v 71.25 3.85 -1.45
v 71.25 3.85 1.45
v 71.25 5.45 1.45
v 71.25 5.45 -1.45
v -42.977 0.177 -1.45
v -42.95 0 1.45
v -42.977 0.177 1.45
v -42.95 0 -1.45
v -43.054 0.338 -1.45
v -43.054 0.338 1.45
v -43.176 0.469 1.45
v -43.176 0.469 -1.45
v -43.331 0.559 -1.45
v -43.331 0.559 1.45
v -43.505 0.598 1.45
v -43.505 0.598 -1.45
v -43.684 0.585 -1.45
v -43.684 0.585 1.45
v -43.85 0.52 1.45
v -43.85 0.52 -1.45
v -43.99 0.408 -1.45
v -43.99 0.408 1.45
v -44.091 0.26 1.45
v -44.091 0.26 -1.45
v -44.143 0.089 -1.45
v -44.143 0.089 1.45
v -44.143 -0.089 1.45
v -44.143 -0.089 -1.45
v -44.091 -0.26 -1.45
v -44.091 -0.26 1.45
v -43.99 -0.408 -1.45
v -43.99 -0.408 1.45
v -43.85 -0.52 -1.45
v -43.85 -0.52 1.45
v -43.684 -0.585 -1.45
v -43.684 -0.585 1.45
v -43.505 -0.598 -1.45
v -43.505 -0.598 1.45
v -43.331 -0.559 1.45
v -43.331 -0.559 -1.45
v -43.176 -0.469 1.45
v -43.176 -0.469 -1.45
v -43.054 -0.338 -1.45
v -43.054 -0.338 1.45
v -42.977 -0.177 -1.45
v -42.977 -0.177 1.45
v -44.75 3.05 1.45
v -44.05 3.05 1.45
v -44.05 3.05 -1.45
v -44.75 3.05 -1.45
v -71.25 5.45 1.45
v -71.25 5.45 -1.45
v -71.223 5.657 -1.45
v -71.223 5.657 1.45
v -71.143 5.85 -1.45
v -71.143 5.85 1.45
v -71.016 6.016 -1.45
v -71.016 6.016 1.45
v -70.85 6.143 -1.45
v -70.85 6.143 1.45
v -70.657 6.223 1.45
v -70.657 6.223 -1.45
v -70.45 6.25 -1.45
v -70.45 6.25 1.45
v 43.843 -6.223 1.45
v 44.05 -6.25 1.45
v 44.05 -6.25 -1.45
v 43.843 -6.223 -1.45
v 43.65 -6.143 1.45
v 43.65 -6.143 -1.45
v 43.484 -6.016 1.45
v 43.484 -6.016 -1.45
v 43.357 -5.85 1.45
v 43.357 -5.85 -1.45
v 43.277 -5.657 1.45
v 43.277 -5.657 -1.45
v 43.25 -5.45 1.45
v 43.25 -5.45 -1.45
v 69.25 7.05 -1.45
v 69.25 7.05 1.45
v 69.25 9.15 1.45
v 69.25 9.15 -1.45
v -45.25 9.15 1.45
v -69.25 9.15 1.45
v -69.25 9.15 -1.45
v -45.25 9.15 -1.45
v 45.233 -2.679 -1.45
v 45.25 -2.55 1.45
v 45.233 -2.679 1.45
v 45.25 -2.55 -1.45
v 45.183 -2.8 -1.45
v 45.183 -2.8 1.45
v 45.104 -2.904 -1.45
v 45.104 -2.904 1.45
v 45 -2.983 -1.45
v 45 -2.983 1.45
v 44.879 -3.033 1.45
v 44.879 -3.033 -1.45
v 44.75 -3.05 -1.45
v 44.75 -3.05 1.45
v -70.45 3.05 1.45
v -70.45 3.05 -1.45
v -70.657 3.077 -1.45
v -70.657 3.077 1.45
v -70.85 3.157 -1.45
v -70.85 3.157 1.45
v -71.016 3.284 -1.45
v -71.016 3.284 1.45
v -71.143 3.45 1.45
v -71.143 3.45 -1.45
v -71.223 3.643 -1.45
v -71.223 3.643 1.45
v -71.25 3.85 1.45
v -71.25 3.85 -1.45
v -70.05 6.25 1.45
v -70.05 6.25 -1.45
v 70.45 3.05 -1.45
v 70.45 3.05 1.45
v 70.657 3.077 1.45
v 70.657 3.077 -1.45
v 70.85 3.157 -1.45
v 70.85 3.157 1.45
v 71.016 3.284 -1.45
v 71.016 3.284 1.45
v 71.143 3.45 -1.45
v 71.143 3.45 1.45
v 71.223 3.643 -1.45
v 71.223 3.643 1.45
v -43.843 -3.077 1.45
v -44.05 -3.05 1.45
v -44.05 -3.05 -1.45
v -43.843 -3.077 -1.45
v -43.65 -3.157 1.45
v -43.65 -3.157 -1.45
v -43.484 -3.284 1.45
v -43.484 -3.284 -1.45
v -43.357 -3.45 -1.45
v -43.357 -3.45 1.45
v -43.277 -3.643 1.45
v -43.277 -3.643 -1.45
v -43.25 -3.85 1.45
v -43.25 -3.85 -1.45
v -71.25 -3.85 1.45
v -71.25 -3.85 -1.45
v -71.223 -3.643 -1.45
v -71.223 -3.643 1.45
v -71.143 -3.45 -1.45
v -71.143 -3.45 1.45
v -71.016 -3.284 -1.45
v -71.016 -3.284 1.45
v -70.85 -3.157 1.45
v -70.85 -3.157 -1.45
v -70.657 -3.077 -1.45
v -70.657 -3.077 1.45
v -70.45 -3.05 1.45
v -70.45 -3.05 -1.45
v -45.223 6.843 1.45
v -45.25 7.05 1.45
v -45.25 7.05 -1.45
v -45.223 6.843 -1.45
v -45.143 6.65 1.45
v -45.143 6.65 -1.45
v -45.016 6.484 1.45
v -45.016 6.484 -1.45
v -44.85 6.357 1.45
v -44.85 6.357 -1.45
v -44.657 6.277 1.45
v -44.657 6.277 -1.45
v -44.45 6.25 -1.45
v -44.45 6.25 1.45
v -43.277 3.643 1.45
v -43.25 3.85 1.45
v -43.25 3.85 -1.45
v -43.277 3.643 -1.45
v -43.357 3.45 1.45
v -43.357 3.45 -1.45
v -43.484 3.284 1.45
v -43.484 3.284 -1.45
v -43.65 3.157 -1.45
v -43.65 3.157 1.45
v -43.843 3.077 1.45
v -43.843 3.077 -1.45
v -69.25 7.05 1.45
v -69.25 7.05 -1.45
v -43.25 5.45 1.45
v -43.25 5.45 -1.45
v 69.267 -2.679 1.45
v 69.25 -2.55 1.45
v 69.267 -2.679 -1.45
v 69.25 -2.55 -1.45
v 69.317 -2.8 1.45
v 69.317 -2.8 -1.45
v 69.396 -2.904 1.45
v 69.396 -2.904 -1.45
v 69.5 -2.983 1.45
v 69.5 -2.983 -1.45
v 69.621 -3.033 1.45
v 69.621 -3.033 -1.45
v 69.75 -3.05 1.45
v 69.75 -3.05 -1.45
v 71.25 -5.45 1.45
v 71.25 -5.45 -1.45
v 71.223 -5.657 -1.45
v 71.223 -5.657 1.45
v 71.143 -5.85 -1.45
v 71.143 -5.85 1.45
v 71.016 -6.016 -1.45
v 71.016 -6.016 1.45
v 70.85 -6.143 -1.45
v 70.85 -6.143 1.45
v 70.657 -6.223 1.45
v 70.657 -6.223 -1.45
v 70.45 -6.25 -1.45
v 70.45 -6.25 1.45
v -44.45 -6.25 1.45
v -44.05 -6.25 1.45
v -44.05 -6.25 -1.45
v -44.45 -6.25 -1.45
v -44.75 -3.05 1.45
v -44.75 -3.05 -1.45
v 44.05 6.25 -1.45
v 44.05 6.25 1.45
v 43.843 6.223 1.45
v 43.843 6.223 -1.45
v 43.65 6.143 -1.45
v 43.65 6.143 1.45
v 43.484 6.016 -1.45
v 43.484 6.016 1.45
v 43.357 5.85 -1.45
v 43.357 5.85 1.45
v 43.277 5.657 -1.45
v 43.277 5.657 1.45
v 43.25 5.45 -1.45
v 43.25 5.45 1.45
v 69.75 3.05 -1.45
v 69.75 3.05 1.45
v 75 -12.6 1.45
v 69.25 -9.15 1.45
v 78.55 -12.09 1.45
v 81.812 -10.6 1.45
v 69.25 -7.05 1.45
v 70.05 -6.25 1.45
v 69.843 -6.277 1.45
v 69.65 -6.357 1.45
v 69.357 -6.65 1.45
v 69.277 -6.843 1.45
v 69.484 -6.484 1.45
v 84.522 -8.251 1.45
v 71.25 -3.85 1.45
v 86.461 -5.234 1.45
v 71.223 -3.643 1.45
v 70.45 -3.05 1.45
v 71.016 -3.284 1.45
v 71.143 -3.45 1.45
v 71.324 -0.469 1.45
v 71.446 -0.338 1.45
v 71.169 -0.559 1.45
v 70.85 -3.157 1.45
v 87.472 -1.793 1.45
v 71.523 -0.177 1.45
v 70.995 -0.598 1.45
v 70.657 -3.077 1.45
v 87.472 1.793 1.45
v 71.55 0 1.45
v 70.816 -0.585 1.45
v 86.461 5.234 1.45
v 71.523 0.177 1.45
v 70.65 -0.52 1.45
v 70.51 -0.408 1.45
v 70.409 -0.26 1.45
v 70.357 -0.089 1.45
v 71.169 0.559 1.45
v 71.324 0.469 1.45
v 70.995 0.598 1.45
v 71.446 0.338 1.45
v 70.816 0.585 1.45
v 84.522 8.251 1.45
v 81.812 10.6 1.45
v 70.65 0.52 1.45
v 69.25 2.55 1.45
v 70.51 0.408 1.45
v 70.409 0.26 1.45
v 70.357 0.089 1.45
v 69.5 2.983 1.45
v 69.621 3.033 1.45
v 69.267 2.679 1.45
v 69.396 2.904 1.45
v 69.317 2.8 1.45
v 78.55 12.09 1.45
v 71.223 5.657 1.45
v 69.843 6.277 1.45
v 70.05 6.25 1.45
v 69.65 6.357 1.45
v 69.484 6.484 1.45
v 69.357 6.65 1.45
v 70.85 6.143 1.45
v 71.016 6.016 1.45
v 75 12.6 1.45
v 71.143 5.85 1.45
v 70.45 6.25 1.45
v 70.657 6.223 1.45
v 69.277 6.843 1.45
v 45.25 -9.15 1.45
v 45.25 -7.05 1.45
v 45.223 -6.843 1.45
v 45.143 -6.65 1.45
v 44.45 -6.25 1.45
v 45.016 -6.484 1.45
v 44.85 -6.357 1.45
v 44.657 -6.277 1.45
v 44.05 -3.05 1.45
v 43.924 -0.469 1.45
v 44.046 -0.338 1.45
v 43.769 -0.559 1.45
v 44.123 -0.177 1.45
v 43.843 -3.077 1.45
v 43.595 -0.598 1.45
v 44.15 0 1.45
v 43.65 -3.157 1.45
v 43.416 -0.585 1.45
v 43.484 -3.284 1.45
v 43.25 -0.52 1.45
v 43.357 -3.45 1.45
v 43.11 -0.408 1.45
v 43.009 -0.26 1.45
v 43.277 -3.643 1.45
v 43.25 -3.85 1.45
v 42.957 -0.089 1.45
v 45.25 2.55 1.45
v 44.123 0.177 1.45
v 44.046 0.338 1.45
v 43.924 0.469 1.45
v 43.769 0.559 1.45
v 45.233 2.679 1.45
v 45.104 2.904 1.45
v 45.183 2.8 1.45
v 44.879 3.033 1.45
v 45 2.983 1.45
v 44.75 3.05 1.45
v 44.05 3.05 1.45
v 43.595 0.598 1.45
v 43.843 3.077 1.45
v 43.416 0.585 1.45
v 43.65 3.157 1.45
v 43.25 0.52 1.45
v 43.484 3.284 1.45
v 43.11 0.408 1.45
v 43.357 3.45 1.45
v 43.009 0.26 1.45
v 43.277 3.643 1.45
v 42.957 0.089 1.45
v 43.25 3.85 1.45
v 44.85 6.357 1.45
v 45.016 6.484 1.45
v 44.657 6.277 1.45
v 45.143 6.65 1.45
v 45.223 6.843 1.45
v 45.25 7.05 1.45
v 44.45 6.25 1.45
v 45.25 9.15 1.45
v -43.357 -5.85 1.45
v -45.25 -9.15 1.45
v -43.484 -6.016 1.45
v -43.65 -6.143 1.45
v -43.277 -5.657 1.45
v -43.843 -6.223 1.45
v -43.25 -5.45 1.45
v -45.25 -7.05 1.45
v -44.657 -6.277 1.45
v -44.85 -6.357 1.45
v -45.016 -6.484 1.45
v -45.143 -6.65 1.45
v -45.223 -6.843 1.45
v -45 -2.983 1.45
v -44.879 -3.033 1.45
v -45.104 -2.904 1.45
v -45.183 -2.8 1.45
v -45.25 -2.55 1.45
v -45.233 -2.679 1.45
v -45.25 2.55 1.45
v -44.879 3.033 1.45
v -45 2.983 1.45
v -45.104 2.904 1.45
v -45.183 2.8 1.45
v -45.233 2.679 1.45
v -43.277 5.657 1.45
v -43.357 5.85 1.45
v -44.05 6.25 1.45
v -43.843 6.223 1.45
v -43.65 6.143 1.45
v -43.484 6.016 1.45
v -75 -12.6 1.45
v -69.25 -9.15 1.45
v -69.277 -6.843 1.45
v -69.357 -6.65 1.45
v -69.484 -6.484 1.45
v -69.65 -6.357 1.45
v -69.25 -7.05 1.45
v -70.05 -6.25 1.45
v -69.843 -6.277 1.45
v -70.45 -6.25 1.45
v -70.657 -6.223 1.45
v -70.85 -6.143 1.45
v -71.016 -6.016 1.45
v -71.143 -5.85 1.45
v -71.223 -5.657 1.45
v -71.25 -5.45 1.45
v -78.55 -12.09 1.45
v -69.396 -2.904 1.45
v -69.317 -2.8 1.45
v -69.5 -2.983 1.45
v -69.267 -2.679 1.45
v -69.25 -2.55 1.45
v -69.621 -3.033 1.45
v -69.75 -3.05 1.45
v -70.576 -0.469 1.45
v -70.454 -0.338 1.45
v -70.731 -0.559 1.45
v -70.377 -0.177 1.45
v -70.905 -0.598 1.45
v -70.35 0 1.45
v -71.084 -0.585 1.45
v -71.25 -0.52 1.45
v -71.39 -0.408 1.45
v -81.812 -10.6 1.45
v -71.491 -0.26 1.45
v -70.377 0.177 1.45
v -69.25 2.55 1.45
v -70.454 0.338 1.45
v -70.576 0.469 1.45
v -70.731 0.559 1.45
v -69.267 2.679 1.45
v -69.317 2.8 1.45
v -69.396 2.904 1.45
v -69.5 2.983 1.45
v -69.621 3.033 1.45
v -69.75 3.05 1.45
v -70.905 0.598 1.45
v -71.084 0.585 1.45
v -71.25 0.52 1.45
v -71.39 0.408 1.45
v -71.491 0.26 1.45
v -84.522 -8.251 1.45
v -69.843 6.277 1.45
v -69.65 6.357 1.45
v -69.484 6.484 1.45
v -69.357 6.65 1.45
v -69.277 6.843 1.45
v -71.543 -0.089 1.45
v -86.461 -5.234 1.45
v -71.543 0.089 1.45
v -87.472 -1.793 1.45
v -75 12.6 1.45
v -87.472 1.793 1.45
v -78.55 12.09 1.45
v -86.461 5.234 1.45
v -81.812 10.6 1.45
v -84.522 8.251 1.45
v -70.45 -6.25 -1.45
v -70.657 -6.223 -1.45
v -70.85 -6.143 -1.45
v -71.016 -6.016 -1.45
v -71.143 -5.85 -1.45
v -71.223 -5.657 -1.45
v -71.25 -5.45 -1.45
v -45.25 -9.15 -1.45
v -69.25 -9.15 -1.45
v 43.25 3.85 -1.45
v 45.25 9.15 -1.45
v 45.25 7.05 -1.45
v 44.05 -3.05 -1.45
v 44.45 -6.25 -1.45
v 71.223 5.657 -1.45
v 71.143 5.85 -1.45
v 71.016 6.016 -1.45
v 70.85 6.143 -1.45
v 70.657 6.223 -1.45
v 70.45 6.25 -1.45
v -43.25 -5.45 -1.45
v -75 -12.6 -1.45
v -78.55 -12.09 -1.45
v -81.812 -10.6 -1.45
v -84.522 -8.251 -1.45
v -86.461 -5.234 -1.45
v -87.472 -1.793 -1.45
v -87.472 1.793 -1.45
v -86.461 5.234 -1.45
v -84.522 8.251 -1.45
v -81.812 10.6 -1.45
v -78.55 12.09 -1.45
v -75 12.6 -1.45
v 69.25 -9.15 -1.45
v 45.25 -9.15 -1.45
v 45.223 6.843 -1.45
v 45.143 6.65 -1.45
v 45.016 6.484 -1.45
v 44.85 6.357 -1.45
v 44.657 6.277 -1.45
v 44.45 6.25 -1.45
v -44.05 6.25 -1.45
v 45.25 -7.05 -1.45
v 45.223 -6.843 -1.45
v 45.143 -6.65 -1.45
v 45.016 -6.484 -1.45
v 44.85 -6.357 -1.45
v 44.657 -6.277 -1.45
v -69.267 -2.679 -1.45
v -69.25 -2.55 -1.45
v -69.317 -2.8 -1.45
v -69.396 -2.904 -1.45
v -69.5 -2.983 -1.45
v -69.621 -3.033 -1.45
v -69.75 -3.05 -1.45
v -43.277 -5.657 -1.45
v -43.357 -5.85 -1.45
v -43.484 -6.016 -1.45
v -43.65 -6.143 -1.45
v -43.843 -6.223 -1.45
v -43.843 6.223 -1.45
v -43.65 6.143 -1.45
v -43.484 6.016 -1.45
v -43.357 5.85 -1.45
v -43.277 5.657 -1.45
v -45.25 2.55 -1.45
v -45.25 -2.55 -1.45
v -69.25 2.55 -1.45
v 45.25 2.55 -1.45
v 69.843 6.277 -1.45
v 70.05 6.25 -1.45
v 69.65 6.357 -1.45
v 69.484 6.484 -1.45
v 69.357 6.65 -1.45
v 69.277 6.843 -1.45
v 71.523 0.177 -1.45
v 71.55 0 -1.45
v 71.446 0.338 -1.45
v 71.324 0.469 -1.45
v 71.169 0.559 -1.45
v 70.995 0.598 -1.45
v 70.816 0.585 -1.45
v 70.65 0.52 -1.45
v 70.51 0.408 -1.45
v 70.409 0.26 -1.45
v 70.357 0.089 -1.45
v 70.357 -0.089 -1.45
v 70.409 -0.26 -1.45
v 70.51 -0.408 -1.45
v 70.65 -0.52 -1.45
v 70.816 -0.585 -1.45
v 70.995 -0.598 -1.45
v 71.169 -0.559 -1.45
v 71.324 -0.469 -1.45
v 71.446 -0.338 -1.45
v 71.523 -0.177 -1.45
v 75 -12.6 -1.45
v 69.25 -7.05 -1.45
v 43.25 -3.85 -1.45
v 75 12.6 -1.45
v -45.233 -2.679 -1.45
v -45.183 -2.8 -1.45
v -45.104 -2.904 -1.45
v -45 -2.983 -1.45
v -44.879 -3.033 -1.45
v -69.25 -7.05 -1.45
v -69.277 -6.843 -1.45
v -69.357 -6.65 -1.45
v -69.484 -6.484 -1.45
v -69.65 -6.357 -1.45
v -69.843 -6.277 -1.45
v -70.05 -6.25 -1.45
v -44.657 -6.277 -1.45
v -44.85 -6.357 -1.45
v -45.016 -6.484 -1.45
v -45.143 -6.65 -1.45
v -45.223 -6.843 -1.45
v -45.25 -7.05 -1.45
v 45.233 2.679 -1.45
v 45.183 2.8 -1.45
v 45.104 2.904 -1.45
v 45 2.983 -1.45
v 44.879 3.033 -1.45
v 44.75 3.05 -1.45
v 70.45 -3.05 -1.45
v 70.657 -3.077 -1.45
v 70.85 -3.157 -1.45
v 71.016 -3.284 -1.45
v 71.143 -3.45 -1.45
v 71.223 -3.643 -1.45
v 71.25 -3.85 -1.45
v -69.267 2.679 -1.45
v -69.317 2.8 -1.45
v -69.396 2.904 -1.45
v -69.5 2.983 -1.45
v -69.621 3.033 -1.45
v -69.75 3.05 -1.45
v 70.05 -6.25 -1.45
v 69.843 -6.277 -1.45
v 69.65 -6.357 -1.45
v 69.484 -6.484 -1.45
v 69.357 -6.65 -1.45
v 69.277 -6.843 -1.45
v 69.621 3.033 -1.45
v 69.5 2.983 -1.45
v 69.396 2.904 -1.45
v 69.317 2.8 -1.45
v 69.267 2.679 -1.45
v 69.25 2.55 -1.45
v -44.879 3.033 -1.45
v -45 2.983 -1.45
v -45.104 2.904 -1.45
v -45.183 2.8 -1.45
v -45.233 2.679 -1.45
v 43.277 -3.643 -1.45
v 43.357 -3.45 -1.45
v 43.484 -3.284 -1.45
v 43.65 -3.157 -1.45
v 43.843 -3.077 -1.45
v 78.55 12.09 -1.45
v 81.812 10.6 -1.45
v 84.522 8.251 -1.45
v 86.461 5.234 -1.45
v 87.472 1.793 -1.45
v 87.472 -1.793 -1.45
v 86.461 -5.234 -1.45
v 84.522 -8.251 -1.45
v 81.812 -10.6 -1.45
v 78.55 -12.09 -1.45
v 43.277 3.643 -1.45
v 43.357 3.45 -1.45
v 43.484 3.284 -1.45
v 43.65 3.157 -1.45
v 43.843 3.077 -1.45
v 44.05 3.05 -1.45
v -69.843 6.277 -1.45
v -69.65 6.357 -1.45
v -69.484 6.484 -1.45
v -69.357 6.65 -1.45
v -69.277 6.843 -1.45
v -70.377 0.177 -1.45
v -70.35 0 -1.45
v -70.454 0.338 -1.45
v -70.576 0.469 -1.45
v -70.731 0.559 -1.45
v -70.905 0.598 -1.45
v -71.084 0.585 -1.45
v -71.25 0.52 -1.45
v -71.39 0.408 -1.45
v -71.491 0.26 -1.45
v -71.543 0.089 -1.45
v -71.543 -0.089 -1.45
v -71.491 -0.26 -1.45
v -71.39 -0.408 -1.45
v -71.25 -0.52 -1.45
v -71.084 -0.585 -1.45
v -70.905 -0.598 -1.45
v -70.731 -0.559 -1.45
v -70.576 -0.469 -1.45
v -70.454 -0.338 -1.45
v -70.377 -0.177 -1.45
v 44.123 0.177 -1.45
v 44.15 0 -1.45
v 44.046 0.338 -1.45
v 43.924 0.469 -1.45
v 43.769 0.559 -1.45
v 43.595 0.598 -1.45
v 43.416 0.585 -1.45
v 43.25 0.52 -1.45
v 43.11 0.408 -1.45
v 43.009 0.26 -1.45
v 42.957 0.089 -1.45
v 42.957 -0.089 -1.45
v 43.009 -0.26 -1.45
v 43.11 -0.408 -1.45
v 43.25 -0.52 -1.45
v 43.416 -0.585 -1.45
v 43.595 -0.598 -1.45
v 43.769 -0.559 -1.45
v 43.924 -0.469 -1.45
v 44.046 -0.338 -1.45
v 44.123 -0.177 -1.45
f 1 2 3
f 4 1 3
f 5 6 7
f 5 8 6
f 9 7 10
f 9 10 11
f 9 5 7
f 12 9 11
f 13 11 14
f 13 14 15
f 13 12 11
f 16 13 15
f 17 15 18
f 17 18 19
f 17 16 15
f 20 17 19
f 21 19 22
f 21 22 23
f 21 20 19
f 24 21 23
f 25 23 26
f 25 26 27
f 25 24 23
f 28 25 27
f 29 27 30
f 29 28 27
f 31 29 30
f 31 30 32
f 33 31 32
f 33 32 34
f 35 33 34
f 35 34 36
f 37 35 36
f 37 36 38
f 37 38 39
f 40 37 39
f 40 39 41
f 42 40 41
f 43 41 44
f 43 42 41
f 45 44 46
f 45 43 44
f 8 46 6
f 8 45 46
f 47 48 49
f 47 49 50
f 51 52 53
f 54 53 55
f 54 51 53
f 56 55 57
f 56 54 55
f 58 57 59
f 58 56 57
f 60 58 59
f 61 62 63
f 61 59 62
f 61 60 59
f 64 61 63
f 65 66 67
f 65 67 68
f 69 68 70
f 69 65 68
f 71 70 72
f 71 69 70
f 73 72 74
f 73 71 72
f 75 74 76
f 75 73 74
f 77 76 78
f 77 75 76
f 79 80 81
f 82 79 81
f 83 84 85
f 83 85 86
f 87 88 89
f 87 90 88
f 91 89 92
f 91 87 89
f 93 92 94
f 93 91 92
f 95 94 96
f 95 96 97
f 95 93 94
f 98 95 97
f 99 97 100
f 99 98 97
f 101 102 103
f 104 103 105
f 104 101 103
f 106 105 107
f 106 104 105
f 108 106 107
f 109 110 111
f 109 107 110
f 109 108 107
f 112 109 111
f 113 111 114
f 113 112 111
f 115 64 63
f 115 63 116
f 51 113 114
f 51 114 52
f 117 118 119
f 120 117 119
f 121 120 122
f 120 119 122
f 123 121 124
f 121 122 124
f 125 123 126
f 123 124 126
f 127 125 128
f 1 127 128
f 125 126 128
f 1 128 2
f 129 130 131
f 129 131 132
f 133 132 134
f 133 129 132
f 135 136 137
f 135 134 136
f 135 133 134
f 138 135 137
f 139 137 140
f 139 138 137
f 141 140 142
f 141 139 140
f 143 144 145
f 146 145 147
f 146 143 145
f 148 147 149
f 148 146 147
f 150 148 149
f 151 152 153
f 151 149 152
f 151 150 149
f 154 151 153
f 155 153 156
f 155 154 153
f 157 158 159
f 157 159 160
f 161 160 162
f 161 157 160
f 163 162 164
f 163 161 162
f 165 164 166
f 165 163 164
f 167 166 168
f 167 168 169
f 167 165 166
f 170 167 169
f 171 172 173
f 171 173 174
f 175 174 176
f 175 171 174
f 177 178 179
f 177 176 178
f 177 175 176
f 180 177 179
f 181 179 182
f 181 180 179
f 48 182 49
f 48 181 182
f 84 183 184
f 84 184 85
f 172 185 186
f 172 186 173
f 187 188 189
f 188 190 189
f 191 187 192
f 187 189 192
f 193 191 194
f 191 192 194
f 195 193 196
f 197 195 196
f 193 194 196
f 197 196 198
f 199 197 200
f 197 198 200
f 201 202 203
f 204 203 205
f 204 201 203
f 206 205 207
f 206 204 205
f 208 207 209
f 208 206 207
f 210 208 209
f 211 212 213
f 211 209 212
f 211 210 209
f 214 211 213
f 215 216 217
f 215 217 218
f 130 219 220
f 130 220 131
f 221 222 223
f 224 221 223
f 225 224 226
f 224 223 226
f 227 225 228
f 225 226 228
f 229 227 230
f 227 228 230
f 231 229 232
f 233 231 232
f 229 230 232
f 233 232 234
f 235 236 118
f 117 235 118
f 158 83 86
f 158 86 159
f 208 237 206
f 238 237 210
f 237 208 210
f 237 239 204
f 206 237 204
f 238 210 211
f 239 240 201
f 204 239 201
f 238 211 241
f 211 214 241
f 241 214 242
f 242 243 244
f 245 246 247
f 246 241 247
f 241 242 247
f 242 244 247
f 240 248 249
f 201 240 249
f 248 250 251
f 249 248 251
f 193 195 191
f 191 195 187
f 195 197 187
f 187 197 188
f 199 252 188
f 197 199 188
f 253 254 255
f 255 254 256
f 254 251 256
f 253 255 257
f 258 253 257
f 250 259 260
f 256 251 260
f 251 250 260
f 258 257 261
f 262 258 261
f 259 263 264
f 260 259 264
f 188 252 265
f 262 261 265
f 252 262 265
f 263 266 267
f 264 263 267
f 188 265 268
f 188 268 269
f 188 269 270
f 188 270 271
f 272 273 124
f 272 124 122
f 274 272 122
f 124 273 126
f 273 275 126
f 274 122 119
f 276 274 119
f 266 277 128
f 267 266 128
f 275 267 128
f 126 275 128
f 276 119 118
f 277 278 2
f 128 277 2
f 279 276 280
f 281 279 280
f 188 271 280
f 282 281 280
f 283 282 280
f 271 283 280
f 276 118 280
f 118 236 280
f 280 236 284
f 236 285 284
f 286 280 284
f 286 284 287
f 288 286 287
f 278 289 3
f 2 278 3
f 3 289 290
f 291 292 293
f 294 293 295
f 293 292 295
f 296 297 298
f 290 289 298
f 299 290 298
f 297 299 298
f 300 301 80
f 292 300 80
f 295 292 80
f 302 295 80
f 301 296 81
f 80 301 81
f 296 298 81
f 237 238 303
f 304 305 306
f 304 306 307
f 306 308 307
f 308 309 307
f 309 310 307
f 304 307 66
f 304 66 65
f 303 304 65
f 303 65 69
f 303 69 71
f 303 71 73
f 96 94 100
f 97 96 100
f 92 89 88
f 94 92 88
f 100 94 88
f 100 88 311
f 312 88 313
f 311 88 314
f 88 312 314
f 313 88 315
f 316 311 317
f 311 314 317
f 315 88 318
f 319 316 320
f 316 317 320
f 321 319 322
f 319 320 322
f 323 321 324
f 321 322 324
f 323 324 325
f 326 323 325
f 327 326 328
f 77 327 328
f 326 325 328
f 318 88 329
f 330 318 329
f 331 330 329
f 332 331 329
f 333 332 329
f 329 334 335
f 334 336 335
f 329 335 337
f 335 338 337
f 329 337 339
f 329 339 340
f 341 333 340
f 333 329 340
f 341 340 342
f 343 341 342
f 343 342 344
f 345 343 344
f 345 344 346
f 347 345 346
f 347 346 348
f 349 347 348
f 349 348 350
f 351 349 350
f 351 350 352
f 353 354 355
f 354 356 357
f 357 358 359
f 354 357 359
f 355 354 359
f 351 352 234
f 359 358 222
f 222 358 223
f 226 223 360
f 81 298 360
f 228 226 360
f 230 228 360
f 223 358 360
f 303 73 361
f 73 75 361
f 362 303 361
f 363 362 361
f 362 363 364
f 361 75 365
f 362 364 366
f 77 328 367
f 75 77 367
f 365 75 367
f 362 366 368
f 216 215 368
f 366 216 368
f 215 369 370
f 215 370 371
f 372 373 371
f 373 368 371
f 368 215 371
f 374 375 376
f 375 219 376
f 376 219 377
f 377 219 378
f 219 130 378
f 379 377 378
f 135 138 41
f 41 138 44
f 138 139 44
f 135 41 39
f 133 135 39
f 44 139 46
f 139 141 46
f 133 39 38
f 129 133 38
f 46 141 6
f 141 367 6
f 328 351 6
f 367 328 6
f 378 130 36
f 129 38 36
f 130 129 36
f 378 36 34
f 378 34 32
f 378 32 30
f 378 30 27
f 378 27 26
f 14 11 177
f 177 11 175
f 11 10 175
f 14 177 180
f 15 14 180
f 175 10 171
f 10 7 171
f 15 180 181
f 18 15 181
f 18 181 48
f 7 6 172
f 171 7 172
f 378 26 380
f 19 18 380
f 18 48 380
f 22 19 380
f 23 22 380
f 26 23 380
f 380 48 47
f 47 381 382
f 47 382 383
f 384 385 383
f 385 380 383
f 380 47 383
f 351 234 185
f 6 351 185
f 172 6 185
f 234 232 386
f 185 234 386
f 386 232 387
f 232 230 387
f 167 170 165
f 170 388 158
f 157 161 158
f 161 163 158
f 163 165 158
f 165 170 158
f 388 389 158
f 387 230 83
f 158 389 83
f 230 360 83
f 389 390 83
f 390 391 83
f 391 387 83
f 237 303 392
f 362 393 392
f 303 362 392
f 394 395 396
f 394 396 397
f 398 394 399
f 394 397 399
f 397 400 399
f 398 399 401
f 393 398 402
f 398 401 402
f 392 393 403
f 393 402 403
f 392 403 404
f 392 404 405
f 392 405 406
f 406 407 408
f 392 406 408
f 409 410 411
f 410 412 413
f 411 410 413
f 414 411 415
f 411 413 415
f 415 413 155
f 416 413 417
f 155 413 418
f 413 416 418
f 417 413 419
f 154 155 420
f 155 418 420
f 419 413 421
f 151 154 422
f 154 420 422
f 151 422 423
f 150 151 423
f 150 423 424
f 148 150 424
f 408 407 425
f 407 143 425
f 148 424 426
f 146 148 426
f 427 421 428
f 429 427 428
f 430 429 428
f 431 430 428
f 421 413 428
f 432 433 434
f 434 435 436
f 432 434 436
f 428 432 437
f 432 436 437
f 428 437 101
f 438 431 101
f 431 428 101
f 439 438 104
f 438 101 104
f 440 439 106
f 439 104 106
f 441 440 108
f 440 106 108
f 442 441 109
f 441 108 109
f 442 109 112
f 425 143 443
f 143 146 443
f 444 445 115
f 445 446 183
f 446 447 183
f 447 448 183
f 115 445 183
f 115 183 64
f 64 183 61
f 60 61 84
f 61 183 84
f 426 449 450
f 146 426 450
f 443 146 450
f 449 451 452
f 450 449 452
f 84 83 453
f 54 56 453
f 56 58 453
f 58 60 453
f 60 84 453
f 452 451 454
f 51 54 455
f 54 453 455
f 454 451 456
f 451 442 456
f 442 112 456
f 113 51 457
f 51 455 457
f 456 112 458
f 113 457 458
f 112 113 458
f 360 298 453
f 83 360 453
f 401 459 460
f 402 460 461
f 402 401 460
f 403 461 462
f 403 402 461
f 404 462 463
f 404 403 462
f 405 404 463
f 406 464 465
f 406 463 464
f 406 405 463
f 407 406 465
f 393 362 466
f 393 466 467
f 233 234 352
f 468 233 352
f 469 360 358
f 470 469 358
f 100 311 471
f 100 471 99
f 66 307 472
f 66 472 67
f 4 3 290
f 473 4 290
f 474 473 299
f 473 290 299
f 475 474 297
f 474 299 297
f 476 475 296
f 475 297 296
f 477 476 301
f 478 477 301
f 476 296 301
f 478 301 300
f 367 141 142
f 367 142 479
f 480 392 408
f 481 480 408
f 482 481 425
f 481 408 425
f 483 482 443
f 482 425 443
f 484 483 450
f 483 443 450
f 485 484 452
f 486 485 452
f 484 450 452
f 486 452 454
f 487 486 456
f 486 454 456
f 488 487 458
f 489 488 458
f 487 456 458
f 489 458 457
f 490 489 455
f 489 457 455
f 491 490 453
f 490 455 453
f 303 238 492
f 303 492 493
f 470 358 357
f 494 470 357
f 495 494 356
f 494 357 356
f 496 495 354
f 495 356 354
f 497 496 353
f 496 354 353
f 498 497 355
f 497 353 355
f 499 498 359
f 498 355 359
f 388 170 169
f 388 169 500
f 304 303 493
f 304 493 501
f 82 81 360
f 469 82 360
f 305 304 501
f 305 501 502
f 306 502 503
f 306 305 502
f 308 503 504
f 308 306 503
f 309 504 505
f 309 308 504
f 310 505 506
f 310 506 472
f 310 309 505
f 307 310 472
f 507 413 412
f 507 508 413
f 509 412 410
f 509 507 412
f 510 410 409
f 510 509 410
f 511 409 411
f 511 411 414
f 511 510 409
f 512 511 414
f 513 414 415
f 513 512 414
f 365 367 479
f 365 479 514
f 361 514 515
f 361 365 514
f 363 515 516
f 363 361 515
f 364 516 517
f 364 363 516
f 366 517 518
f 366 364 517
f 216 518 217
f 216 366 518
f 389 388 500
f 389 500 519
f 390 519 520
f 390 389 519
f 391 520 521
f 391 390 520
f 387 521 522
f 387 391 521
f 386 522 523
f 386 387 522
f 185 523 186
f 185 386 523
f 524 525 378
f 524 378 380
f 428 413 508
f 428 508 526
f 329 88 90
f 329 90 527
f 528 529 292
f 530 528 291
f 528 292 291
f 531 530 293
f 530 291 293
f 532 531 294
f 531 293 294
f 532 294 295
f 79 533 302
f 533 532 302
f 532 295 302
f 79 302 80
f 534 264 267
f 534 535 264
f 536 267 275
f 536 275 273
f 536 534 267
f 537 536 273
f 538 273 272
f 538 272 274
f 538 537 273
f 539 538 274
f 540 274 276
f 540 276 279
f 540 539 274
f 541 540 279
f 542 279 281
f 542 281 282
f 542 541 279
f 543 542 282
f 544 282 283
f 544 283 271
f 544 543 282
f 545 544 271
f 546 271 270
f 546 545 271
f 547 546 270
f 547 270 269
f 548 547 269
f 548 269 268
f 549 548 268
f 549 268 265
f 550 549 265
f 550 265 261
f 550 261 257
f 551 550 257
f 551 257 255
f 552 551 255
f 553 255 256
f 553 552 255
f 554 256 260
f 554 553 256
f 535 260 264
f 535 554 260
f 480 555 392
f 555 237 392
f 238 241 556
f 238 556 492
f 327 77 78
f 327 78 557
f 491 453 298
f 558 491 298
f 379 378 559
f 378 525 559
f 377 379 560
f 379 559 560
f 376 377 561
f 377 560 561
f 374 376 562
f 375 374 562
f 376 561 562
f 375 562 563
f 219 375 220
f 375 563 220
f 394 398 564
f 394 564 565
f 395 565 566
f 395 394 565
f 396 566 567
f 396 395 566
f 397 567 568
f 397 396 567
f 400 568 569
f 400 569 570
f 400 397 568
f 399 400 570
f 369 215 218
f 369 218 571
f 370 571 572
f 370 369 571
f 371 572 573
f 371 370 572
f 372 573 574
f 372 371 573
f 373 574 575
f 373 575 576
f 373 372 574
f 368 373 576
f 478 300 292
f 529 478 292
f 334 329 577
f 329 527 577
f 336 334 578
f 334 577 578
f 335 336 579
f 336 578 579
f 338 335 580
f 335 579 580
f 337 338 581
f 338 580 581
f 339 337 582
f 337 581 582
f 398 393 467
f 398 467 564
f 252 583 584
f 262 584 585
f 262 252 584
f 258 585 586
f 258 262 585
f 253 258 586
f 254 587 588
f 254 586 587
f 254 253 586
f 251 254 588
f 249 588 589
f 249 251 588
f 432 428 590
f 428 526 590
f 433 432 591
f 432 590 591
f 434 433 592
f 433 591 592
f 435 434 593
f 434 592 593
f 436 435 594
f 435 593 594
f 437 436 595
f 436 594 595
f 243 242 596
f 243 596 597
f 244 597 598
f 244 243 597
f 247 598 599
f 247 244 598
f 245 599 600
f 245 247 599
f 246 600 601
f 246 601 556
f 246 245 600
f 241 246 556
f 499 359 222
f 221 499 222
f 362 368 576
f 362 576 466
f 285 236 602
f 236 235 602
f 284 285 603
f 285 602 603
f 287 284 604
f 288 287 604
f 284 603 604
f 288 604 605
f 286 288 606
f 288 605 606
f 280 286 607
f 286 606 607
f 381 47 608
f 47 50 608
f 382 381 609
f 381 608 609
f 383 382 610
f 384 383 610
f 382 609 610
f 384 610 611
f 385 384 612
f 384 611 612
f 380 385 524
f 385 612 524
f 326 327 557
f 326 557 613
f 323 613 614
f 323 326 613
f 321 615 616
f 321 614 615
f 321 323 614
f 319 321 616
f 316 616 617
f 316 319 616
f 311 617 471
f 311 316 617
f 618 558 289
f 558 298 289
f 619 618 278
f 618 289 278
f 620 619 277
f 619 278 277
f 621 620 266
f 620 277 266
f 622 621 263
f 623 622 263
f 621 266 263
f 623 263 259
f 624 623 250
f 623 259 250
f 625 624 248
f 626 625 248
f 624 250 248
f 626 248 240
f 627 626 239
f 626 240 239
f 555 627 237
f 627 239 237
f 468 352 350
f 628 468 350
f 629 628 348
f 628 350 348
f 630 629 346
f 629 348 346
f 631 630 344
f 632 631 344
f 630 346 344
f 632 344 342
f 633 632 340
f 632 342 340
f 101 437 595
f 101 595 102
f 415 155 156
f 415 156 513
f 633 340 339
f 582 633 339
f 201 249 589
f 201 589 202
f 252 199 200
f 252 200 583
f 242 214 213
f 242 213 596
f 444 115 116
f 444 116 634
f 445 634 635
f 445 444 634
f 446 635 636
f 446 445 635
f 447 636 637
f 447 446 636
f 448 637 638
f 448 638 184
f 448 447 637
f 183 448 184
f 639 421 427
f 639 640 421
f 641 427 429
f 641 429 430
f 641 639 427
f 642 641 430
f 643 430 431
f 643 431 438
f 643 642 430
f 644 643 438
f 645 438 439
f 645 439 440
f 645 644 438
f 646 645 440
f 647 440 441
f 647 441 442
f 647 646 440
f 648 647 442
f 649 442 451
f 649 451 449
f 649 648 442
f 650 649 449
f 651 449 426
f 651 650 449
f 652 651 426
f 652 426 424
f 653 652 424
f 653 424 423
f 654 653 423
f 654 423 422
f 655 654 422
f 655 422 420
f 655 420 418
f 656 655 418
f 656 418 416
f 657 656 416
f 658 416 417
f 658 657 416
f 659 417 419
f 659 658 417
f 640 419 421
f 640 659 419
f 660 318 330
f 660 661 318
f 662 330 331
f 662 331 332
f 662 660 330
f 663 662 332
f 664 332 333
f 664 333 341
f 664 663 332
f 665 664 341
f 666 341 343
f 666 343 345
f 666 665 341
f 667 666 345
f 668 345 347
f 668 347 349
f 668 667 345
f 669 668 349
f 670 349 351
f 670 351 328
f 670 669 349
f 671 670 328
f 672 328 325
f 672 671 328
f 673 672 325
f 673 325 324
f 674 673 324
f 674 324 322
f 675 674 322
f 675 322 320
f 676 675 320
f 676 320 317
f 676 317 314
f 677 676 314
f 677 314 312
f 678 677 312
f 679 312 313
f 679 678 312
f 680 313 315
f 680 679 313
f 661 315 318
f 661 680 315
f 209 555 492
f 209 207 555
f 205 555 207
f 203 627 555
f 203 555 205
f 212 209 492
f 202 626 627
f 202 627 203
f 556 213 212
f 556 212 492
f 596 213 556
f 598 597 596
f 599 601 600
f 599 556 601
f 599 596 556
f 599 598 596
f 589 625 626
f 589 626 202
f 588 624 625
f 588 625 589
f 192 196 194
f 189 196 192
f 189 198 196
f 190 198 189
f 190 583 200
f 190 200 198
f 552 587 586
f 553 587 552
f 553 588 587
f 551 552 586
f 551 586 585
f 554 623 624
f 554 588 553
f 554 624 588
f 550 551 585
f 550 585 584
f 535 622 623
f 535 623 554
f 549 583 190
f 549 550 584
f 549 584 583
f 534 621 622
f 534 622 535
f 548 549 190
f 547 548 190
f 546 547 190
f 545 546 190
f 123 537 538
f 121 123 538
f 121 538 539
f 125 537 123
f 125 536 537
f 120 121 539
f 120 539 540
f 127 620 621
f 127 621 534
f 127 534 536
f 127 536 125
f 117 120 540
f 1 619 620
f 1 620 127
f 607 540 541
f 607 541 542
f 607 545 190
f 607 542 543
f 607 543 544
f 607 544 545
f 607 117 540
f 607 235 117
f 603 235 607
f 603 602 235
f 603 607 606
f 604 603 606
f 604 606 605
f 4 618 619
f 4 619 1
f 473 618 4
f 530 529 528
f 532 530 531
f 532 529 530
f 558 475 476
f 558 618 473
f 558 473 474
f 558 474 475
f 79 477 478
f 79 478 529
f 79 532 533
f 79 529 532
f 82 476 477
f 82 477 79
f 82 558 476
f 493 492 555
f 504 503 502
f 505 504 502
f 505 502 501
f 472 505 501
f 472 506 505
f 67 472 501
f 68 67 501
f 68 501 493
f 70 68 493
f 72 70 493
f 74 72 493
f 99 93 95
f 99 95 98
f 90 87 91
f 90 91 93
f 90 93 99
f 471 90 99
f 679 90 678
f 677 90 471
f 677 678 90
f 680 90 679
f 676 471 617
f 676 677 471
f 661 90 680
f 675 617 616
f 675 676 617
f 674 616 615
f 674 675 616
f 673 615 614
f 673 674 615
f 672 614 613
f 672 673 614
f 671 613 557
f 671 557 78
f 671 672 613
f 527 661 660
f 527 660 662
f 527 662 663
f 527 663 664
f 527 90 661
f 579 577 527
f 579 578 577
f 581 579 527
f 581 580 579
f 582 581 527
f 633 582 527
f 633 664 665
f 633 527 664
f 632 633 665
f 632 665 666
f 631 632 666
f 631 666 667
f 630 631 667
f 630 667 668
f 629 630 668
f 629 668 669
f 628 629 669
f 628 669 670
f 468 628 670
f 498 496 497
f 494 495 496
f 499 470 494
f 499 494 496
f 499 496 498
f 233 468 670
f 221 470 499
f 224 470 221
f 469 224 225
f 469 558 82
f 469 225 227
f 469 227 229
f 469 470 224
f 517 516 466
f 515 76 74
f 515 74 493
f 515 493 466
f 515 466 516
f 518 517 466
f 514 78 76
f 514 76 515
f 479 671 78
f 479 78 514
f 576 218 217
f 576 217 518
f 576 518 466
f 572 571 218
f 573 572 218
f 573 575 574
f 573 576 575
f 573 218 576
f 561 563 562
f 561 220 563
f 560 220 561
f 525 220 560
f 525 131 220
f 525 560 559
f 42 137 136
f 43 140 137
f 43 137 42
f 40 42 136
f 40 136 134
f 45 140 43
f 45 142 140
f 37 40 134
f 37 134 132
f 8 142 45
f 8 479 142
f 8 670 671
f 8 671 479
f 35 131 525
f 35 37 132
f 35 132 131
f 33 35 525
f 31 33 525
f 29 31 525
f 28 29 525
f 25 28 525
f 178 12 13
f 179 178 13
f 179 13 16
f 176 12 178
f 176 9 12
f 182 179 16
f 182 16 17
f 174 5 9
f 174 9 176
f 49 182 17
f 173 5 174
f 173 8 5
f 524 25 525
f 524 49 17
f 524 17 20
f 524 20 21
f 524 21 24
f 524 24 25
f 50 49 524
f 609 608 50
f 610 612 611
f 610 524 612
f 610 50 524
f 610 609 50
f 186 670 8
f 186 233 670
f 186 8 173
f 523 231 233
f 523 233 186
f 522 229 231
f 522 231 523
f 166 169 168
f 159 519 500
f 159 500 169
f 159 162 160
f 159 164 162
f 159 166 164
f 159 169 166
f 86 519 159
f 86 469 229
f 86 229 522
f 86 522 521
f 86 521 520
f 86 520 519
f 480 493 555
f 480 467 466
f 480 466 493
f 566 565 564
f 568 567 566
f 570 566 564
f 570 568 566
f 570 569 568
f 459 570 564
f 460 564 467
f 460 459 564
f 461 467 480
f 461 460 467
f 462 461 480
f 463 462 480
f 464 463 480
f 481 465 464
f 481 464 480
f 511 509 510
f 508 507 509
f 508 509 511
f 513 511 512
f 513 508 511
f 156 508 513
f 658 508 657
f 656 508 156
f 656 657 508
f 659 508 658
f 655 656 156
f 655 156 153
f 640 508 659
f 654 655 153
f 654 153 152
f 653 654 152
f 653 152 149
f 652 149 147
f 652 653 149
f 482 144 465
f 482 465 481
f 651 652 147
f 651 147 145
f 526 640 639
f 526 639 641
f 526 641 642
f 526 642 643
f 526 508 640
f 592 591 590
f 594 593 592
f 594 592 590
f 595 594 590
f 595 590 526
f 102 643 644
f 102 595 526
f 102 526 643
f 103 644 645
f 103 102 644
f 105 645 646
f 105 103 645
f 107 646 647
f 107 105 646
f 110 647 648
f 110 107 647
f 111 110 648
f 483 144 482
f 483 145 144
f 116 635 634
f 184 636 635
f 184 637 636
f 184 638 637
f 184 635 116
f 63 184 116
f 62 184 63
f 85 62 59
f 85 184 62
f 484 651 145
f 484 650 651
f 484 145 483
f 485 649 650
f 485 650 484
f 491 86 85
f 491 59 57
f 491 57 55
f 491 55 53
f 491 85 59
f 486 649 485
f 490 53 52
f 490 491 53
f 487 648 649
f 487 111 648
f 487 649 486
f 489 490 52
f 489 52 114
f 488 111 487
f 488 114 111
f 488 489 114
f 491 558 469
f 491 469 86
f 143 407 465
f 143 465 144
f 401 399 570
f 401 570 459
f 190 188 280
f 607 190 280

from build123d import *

# Parameters (mm, degrees)
SKETCH_1_R          = 0.6
SKETCH_1_W          = 24
SKETCH_1_H          = 12.5
EXTRUDE_1_DEPTH     = 1.45
CUT_EXTRUDE_1_DEPTH = 3
FILLET_1_R          = 0.5


with BuildPart() as part:
    # 草图1 → 凸台-拉伸1 (new body, symmetric)
    with BuildSketch(Plane.XY):
        with BuildLine():
            Line((-75, 12.6), (75, 12.6))
            ThreePointArc((75, 12.6), (87.6, 0), (75, -12.6))
            Line((75, -12.6), (-75, -12.6))
            ThreePointArc((-75, -12.6), (-87.6, 0), (-75, 12.6))
        make_face()
        with Locations((-43.55, 0)):
            Circle(SKETCH_1_R, mode=Mode.SUBTRACT)
        with Locations((-70.95, 0)):
            Circle(SKETCH_1_R, mode=Mode.SUBTRACT)
        with Locations((70.95, 0)):
            Circle(SKETCH_1_R, mode=Mode.SUBTRACT)
        with Locations((43.55, 0)):
            Circle(SKETCH_1_R, mode=Mode.SUBTRACT)
        with Locations((-57.25, 0)):
            Rectangle(SKETCH_1_W, SKETCH_1_H, mode=Mode.SUBTRACT)
        with Locations((57.25, 0)):
            Rectangle(SKETCH_1_W, SKETCH_1_H, mode=Mode.SUBTRACT)
    extrude(amount=EXTRUDE_1_DEPTH, both=True)

    # 草图2 → 切除-拉伸1 (cut)
    with BuildSketch(Plane.XY.offset(1.45)):
        with BuildLine():
            Line((44.45, 6.25), (44.05, 6.25))
            ThreePointArc((44.05, 6.25), (43.484314575, 6.015685425), (43.25, 5.45))
            Line((43.25, 5.45), (43.25, 3.85))
            ThreePointArc((43.25, 3.85), (43.484314575, 3.284314575), (44.05, 3.05))
            Line((44.05, 3.05), (45.25, 3.05))
            Line((45.25, 3.05), (45.25, 6.25))
            Line((45.25, 6.25), (69.25, 6.25))
            Line((69.25, 6.25), (69.25, 3.05))
            Line((69.25, 3.05), (70.45, 3.05))
            ThreePointArc((70.45, 3.05), (71.015685425, 3.284314575), (71.25, 3.85))
            Line((71.25, 3.85), (71.25, 5.45))
            ThreePointArc((71.25, 5.45), (71.015685425, 6.015685425), (70.45, 6.25))
            Line((70.45, 6.25), (70.05, 6.25))
            ThreePointArc((70.05, 6.25), (69.484314575, 6.484314575), (69.25, 7.05))
            Line((69.25, 7.05), (69.25, 9.15))
            Line((69.25, 9.15), (45.25, 9.15))
            Line((45.25, 9.15), (45.25, 7.05))
            ThreePointArc((45.25, 7.05), (45.015685425, 6.484314575), (44.45, 6.25))
        make_face()
        with BuildLine():
            Line((44.05, -3.05), (45.25, -3.05))
            Line((45.25, -3.05), (45.25, -6.25))
            Line((45.25, -6.25), (69.25, -6.25))
            Line((69.25, -6.25), (69.25, -3.05))
            Line((69.25, -3.05), (70.45, -3.05))
            ThreePointArc((70.45, -3.05), (71.015685425, -3.284314575), (71.25, -3.85))
            Line((71.25, -3.85), (71.25, -5.45))
            ThreePointArc((71.25, -5.45), (71.015685425, -6.015685425), (70.45, -6.25))
            Line((70.45, -6.25), (70.05, -6.25))
            ThreePointArc((70.05, -6.25), (69.484314575, -6.484314575), (69.25, -7.05))
            Line((69.25, -7.05), (69.25, -9.15))
            Line((69.25, -9.15), (45.25, -9.15))
            Line((45.25, -9.15), (45.25, -7.05))
            ThreePointArc((45.25, -7.05), (45.015685425, -6.484314575), (44.45, -6.25))
            Line((44.45, -6.25), (44.05, -6.25))
            ThreePointArc((44.05, -6.25), (43.484314575, -6.015685425), (43.25, -5.45))
            Line((43.25, -5.45), (43.25, -3.85))
            ThreePointArc((43.25, -3.85), (43.484314575, -3.284314575), (44.05, -3.05))
        make_face()
        with BuildLine():
            Line((-45.25, 3.05), (-45.25, 6.25))
            Line((-45.25, 6.25), (-69.25, 6.25))
            Line((-69.25, 6.25), (-69.25, 3.05))
            Line((-69.25, 3.05), (-70.45, 3.05))
            ThreePointArc((-70.45, 3.05), (-71.015685425, 3.284314575), (-71.25, 3.85))
            Line((-71.25, 3.85), (-71.25, 5.45))
            ThreePointArc((-71.25, 5.45), (-71.015685425, 6.015685425), (-70.45, 6.25))
            Line((-70.45, 6.25), (-70.05, 6.25))
            ThreePointArc((-70.05, 6.25), (-69.484314575, 6.484314575), (-69.25, 7.05))
            Line((-69.25, 7.05), (-69.25, 9.15))
            Line((-69.25, 9.15), (-45.25, 9.15))
            Line((-45.25, 9.15), (-45.25, 7.05))
            ThreePointArc((-45.25, 7.05), (-45.015685425, 6.484314575), (-44.45, 6.25))
            Line((-44.45, 6.25), (-44.05, 6.25))
            ThreePointArc((-44.05, 6.25), (-43.484314575, 6.015685425), (-43.25, 5.45))
            Line((-43.25, 5.45), (-43.25, 3.85))
            ThreePointArc((-43.25, 3.85), (-43.484314575, 3.284314575), (-44.05, 3.05))
            Line((-44.05, 3.05), (-45.25, 3.05))
        make_face()
        with BuildLine():
            Line((-45.25, -7.05), (-45.25, -9.15))
            Line((-45.25, -9.15), (-69.25, -9.15))
            Line((-69.25, -9.15), (-69.25, -7.05))
            ThreePointArc((-69.25, -7.05), (-69.484314575, -6.484314575), (-70.05, -6.25))
            Line((-70.05, -6.25), (-70.45, -6.25))
            ThreePointArc((-70.45, -6.25), (-71.015685425, -6.015685425), (-71.25, -5.45))
            Line((-71.25, -5.45), (-71.25, -3.85))
            ThreePointArc((-71.25, -3.85), (-71.015685425, -3.284314575), (-70.45, -3.05))
            Line((-70.45, -3.05), (-69.25, -3.05))
            Line((-69.25, -3.05), (-69.25, -6.25))
            Line((-69.25, -6.25), (-45.25, -6.25))
            Line((-45.25, -6.25), (-45.25, -3.05))
            Line((-45.25, -3.05), (-44.05, -3.05))
            ThreePointArc((-44.05, -3.05), (-43.484314575, -3.284314575), (-43.25, -3.85))
            Line((-43.25, -3.85), (-43.25, -5.45))
            ThreePointArc((-43.25, -5.45), (-43.484314575, -6.015685425), (-44.05, -6.25))
            Line((-44.05, -6.25), (-44.45, -6.25))
            ThreePointArc((-44.45, -6.25), (-45.015685425, -6.484314575), (-45.25, -7.05))
        make_face()
    extrude(amount=-CUT_EXTRUDE_1_DEPTH, mode=Mode.SUBTRACT)

    # 圆角1
    fillet_1_edges = [part.edges().sort_by_distance(p)[0] for p in [
        (69.25, -3.05, 0),
        (-69.25, 3.05, 0),
        (45.25, -3.05, 0),
        (-45.25, 3.05, 0),
        (-45.25, -3.05, 0),
        (-69.25, -3.05, 0),
        (69.25, 3.05, 0),
        (45.25, 3.05, 0),
    ]]
    fillet(fillet_1_edges, radius=FILLET_1_R)


solid = part.part
